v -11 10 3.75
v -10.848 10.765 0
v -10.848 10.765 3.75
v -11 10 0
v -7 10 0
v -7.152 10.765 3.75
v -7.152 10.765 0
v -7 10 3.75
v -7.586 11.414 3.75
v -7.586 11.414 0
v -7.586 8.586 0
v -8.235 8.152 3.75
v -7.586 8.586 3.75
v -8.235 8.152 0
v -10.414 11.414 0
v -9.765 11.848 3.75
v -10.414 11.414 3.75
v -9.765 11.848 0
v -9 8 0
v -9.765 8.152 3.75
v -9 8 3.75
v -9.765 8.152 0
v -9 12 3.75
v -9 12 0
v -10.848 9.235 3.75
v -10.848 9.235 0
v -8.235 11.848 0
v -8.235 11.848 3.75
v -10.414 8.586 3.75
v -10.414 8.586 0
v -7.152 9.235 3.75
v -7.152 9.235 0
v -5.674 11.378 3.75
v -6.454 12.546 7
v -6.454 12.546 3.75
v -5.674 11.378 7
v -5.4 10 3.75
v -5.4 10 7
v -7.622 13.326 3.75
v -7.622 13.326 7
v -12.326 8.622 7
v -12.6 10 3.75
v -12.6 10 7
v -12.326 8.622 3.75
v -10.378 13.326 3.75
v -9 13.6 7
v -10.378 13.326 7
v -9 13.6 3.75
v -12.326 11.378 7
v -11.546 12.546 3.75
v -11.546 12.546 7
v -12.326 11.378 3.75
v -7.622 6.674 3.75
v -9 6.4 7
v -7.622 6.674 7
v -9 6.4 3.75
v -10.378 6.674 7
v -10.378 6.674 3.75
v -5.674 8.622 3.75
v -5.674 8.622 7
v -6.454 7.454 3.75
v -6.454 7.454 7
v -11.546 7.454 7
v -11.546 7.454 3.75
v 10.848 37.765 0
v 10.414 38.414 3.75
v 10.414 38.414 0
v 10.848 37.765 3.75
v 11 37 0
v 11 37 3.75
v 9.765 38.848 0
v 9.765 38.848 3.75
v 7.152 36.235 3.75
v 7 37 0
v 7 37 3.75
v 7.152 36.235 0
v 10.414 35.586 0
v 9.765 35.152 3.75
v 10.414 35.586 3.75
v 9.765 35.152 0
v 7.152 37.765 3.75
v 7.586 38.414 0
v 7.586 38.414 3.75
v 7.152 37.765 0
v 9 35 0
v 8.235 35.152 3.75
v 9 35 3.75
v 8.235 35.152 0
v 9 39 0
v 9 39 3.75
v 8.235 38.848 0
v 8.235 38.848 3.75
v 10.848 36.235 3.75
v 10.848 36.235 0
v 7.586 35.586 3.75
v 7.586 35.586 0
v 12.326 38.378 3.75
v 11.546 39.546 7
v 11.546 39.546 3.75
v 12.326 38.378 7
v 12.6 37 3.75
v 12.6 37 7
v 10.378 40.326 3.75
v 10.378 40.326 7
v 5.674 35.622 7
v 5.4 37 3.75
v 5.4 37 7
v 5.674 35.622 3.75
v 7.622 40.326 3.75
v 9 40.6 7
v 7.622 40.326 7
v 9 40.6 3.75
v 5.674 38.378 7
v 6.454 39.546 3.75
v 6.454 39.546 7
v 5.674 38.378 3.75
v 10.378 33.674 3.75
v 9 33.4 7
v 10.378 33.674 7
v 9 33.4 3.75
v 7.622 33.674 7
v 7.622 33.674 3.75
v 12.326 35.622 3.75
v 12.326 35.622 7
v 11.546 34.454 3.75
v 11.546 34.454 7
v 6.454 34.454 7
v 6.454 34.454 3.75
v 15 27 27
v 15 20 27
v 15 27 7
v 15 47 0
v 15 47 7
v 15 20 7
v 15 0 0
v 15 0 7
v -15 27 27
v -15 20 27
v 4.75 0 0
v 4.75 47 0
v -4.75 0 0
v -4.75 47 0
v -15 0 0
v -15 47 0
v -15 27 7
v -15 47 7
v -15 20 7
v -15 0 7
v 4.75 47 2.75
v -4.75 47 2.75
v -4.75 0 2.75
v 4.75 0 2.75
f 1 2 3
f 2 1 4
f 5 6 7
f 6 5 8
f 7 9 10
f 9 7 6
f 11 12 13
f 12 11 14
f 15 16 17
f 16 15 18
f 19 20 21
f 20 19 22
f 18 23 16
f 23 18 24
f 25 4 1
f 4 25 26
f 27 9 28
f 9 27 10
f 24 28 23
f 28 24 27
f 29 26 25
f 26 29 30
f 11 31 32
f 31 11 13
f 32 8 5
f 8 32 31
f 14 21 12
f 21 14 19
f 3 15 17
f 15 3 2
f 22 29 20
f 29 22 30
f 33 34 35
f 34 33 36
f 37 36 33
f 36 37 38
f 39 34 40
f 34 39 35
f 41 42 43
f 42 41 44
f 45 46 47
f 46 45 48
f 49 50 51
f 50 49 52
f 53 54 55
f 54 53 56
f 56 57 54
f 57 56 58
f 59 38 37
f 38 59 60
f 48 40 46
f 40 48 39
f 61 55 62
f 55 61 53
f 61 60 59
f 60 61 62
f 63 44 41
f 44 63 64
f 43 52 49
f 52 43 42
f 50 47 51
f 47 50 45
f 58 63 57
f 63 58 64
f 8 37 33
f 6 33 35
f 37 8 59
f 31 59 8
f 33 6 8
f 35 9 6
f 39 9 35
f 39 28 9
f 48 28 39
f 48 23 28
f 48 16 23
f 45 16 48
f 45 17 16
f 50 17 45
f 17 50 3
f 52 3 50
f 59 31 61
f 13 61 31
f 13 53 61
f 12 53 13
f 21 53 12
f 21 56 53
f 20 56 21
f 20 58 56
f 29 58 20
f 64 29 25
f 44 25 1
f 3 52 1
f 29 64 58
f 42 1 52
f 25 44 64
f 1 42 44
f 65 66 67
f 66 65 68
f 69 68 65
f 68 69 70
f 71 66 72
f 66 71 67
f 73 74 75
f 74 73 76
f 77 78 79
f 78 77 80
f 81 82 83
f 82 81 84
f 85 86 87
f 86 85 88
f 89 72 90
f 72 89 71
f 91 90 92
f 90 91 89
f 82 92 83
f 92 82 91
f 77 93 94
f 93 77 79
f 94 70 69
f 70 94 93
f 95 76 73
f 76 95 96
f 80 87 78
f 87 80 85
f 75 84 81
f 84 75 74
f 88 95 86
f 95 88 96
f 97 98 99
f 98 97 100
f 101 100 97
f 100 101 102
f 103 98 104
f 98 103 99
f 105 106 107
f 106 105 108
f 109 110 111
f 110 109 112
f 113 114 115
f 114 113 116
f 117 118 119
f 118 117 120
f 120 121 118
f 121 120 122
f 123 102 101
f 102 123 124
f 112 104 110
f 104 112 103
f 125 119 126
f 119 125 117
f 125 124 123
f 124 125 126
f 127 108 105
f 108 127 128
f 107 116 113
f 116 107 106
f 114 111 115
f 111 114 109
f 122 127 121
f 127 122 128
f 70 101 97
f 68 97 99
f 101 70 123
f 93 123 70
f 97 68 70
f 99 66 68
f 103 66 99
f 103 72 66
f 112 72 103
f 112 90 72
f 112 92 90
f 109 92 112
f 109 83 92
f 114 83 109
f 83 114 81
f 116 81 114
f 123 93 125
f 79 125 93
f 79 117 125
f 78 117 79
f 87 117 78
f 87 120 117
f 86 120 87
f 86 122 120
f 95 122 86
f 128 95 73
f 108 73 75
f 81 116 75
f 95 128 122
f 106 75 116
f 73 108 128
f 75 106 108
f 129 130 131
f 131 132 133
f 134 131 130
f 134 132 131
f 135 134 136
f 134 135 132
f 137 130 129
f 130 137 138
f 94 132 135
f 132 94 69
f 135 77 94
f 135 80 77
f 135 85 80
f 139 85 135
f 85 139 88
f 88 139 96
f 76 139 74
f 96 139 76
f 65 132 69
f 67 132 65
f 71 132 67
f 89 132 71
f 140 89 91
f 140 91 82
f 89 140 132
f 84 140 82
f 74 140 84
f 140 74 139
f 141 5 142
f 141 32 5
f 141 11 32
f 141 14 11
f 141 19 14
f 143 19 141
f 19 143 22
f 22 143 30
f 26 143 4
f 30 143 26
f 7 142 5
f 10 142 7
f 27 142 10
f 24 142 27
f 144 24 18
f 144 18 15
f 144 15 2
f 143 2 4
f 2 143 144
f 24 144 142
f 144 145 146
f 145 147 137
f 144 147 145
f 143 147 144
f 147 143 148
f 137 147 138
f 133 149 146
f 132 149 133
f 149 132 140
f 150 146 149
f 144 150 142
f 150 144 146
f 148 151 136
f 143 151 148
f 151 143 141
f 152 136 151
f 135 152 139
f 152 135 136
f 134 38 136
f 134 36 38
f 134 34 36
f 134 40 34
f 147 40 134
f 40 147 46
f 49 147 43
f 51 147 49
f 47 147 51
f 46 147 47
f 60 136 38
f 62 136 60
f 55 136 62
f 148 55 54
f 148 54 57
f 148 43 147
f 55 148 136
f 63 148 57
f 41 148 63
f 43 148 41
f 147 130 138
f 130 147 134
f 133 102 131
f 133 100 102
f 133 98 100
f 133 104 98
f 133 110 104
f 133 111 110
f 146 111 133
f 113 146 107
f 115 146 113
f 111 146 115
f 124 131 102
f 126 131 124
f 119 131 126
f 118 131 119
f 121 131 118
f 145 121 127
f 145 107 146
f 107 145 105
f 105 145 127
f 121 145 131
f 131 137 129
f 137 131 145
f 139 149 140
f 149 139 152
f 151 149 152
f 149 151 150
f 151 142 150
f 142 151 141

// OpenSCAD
// Base is 49mm wide, 25mm deep
// Body is 39mm wide
// Tab is 16mm wide
// Locks are 6mm from back, 12mm from side, 10mm long

module screw (x, y)
{
  translate ([x, y, 0]) {
    cylinder (h=10, d=4.0, $fn=16, center=true);
  }
  translate ([x, y, 6]) {
    cylinder (h=4.5, d=7.2, $fn=16, center=true);
  }
}

translate ([-15, 0, 0]) {
  difference () {
     // Floor
    cube ([30, 47, 27]);

    // Remove cubes to create vertical
    translate ([0, 0, 7]) {
      cube ([30, 20, 27]);
    }
    translate ([0, 27, 7]) {
      cube ([30, 20, 27]);
    }
    
    // Tie-wrap
    translate ([10.25, 0, 0]) {
      cube ([9.5, 47, 2.75]);
    }
    
    //  Screw holes & head recesses
    screw (6, 10);
    screw (24, 37);
  } 
}
